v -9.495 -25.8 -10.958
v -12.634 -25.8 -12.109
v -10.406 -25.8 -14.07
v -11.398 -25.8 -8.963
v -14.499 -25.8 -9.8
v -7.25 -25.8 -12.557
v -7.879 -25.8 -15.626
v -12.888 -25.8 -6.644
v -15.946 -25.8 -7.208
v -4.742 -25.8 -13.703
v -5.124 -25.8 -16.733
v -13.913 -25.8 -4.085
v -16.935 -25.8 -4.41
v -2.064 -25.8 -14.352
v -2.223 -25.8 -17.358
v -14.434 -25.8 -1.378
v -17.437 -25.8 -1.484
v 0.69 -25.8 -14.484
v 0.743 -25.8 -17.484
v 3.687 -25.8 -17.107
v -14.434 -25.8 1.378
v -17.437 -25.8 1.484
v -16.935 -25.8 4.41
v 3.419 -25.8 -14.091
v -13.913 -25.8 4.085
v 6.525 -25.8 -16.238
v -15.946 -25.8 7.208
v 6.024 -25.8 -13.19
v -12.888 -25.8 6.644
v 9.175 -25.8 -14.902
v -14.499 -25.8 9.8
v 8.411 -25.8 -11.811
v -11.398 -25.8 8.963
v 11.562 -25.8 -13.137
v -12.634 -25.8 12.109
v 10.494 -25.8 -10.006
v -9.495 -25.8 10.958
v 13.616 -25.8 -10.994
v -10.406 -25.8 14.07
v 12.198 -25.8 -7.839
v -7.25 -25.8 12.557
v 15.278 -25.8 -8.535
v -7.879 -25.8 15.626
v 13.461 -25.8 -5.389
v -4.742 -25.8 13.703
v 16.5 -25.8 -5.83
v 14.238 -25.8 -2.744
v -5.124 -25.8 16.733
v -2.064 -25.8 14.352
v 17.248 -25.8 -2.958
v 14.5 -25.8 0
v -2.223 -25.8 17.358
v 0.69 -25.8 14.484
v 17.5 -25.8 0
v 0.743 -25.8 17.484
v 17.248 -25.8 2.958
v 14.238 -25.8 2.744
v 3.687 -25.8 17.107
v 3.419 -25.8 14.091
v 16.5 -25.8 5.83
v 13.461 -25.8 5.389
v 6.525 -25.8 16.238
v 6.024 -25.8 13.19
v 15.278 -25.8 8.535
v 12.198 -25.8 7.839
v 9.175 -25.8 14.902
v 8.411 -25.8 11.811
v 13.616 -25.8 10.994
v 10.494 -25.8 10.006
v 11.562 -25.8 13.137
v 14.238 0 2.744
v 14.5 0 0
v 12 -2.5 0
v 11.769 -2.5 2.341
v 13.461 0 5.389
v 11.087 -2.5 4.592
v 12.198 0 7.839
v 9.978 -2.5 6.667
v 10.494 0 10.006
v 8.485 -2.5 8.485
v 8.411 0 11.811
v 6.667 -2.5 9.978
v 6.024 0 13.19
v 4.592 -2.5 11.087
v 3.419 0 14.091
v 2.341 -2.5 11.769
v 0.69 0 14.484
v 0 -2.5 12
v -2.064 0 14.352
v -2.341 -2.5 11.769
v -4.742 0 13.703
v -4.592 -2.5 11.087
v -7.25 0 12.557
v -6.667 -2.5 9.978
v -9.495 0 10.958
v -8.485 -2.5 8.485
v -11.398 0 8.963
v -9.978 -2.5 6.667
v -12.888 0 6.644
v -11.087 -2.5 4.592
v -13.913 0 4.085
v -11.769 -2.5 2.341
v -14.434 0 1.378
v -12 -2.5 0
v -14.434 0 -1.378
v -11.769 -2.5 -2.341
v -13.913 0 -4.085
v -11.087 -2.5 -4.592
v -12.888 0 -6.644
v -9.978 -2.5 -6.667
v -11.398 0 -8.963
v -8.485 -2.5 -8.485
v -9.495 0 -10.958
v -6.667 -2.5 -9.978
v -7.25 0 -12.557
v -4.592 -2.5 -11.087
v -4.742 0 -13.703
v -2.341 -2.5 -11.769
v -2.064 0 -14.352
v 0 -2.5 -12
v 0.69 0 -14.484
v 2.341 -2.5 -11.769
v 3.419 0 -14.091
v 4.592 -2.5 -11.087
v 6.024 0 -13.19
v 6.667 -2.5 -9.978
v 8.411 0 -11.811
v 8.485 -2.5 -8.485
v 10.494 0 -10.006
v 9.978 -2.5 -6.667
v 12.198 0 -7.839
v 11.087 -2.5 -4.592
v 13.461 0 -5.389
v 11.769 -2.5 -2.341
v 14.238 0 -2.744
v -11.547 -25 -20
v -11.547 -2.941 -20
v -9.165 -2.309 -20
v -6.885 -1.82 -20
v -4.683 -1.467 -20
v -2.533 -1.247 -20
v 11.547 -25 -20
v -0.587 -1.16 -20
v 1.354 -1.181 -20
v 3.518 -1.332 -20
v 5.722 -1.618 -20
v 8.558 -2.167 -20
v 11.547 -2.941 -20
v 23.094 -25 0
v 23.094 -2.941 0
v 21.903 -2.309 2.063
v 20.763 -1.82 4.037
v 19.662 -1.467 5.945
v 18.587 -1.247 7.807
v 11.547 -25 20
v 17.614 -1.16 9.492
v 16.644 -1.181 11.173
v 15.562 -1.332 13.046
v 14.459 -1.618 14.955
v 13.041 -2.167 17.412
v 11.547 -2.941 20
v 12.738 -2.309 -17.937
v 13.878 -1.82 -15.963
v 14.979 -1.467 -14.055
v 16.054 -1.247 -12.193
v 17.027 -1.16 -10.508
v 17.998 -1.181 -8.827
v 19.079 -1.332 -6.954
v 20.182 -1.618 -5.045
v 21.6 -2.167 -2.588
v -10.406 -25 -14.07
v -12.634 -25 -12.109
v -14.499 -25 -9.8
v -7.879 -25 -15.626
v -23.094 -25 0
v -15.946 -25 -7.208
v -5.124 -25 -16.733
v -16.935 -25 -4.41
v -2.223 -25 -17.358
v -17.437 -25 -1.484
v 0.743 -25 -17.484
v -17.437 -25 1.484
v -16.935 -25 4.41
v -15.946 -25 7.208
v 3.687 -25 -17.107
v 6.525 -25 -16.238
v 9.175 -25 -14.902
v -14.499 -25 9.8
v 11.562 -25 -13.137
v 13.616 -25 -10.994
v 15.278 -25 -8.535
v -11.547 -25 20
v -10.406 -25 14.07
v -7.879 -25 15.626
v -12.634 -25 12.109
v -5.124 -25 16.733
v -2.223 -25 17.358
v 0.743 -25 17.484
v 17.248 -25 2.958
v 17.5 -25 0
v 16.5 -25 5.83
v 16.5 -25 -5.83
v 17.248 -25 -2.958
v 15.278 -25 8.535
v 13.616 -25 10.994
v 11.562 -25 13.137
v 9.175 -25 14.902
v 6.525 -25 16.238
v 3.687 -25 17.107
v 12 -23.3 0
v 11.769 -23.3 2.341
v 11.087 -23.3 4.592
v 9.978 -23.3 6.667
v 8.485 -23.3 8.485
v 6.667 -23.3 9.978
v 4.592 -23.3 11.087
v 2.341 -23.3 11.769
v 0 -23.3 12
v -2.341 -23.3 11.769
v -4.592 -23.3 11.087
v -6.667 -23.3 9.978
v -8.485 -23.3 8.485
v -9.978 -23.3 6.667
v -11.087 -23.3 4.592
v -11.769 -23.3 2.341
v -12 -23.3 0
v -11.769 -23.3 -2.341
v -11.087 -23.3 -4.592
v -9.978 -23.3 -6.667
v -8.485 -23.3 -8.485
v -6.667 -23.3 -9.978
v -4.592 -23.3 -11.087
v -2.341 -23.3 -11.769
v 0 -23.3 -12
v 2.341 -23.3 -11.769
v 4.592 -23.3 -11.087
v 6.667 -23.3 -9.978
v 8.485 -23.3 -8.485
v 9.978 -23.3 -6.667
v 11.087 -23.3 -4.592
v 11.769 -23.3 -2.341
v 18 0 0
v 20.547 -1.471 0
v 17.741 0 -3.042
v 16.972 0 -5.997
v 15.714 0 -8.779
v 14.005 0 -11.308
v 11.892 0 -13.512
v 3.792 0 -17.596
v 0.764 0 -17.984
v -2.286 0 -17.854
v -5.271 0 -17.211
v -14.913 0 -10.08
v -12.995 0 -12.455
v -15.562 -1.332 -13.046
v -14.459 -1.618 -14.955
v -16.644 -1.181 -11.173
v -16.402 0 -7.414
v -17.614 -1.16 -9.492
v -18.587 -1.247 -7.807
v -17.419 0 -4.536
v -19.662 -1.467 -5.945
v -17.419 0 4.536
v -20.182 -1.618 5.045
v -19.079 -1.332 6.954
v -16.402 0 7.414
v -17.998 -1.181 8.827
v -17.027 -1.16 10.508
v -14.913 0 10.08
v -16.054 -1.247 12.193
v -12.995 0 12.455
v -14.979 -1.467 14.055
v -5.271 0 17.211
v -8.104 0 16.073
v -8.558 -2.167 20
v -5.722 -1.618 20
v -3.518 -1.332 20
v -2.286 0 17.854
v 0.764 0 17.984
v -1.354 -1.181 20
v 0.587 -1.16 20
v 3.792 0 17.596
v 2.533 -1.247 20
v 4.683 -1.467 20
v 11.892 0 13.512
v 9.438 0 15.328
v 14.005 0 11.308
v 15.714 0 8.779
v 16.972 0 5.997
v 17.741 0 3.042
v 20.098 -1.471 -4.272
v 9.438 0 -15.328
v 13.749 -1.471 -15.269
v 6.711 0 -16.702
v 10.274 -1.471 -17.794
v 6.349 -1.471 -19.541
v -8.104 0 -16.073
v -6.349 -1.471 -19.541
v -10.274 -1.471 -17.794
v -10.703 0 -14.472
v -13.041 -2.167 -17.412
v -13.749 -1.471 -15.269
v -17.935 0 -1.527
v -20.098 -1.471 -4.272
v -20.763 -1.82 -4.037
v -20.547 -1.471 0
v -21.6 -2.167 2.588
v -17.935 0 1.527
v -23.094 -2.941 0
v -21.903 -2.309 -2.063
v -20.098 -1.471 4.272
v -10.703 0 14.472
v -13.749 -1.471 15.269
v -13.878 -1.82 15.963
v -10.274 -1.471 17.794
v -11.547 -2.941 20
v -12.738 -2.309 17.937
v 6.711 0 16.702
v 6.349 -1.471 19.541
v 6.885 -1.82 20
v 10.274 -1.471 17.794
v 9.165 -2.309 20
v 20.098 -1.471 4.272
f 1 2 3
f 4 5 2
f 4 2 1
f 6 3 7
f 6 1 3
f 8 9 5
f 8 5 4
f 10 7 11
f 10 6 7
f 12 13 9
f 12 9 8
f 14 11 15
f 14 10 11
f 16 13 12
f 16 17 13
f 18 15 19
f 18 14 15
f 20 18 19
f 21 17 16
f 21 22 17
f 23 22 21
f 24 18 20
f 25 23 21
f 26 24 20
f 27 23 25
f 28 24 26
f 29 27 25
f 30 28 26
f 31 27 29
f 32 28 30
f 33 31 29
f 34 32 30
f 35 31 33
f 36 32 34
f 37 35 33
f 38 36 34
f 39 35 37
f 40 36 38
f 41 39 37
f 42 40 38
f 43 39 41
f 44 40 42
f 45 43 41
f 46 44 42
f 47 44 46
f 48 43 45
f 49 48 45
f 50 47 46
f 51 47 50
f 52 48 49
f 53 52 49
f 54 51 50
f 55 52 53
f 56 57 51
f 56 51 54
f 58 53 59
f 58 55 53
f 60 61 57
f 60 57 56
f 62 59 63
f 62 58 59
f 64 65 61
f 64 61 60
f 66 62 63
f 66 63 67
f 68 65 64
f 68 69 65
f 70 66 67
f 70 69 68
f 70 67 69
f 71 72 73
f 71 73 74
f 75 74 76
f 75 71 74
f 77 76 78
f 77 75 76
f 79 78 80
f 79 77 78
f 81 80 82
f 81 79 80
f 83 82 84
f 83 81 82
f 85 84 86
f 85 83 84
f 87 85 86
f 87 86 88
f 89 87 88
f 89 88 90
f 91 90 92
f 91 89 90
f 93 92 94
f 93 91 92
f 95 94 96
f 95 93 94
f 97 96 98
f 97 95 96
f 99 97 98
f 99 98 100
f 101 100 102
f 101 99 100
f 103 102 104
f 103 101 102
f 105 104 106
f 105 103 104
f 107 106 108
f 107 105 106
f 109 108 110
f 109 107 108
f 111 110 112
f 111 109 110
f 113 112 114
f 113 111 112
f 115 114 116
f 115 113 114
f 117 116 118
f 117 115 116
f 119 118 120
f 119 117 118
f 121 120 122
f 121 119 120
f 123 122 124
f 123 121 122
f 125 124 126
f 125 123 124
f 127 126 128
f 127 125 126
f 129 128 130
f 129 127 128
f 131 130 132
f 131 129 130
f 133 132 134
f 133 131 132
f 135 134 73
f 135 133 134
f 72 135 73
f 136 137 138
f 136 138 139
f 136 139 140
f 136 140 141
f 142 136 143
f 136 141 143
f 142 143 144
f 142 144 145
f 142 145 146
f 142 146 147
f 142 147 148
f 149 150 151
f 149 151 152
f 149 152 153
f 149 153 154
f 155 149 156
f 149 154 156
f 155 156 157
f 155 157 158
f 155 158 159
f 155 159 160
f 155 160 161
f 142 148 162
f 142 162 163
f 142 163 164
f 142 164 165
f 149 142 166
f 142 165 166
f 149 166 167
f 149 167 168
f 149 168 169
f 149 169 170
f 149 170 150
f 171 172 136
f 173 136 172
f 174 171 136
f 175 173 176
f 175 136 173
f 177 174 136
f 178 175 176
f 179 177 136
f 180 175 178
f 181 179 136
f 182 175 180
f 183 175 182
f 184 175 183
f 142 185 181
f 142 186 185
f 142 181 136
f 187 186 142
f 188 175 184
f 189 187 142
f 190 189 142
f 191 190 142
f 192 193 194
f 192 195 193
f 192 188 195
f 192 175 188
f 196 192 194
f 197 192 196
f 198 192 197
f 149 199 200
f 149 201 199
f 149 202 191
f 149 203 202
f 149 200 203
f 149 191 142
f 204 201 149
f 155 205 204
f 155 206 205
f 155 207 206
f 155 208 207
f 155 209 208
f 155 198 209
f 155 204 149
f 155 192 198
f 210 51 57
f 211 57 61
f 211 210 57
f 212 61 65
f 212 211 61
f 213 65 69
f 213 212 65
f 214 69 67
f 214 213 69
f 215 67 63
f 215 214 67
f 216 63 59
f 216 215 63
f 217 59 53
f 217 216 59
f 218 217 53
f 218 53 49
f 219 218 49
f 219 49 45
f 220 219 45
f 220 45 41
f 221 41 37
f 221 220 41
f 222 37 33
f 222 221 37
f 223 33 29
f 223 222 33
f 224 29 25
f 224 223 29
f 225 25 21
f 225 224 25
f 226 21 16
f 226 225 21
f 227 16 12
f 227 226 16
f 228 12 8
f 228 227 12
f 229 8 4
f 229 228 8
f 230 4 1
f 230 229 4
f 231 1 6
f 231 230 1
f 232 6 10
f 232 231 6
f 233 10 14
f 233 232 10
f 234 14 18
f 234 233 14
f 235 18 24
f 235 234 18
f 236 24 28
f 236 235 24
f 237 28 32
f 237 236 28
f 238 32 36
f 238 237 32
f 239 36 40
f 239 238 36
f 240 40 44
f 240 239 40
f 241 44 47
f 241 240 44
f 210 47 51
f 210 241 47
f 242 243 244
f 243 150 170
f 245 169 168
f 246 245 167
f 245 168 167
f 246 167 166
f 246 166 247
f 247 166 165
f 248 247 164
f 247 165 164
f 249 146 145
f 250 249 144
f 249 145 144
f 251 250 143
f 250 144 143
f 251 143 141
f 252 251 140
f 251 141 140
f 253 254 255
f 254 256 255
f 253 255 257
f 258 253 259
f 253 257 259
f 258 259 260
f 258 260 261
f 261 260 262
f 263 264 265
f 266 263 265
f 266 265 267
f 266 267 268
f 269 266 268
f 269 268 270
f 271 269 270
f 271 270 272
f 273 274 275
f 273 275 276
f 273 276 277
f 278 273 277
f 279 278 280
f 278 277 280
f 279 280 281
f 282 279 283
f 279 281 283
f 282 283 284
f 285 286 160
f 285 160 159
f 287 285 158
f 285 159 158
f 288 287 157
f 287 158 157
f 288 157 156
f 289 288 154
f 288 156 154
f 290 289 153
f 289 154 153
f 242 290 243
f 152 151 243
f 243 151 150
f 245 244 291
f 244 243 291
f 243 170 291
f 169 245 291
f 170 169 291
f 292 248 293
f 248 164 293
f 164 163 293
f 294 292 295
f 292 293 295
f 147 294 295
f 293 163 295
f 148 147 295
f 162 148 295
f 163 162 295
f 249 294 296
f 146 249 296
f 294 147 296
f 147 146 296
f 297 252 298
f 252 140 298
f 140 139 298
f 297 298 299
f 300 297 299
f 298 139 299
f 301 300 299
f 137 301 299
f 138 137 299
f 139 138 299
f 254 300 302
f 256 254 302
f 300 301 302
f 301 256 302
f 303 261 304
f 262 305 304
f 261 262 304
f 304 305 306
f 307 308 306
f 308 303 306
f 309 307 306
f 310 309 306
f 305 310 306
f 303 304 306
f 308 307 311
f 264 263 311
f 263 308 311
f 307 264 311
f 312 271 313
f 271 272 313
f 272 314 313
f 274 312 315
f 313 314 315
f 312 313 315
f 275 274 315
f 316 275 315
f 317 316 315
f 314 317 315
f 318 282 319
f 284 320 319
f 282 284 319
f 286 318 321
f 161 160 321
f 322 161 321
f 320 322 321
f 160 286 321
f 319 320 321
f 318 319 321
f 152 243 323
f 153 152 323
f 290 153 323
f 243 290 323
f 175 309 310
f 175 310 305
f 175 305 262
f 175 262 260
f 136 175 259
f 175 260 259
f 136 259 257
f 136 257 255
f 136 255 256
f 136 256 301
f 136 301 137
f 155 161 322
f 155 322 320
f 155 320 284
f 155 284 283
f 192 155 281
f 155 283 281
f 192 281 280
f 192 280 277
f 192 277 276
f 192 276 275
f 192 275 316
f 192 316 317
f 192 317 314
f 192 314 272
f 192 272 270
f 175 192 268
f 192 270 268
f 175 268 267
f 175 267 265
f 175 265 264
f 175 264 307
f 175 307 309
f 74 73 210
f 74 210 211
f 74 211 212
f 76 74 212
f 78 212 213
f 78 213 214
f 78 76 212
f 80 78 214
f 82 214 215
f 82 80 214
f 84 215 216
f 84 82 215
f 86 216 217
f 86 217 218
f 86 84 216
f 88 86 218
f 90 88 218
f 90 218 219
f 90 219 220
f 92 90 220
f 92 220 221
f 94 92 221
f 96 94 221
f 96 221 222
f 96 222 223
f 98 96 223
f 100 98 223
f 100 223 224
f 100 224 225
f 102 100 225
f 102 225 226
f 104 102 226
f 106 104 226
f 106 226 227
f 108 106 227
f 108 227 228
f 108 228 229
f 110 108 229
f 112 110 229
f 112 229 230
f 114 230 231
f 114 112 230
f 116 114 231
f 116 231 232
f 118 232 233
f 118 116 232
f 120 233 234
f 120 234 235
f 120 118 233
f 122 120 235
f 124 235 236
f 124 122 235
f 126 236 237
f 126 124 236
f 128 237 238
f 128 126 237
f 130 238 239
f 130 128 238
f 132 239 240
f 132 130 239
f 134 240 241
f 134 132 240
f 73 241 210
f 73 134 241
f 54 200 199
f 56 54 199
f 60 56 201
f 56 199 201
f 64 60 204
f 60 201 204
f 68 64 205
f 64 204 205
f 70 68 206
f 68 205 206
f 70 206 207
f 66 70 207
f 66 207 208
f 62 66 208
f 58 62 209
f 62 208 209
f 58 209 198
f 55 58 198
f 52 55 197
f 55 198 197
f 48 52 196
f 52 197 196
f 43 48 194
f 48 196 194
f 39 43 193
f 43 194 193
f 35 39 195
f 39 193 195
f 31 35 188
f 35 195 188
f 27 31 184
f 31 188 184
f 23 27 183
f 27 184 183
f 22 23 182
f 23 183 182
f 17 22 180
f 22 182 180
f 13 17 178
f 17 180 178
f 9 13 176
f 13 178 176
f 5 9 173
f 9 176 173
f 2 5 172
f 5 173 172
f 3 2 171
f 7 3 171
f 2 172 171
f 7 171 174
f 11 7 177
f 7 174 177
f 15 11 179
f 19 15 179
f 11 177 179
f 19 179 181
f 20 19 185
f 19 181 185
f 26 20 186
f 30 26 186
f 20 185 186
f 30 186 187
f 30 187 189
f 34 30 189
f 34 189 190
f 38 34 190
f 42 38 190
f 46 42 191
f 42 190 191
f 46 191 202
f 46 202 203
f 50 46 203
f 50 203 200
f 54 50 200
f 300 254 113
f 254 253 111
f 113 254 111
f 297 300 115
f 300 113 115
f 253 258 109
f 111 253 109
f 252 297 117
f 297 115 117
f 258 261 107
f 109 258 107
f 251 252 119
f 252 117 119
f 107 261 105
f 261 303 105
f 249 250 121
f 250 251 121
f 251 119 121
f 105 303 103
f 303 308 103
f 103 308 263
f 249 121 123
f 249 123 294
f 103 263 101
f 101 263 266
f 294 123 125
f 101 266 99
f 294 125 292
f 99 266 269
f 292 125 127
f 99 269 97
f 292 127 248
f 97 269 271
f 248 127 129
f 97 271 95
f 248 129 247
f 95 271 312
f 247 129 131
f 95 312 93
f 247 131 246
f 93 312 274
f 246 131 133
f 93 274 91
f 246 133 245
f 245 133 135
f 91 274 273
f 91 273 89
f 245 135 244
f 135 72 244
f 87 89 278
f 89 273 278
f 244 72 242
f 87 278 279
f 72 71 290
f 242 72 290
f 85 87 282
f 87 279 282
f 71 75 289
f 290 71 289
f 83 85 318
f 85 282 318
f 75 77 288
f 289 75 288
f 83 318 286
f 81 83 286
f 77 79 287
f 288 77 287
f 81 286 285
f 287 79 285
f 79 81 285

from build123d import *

# Parameters (mm, degrees)
F0_R     = 12
F1_DEPTH = 25
F4_R     = 17.5
F4_R_2   = 12
F5_DEPTH = 0.8
F6_SIZE  = 2.5


with BuildPart() as f1:
    # F0 (on Front) → F1 (new body)
    with BuildSketch(Plane.XZ):
        Polygon((11.547005, -20), (23.094011, 0), (11.547005, 20), (-11.547005, 20), (-23.094011, 0), (-11.547005, -20), align=None)
        Circle(F0_R, mode=Mode.SUBTRACT)
    extrude(amount=F1_DEPTH)

    # F2 (on Top) → F3 (revolve, cut)
    with BuildSketch(Plane.XY):
        Polygon((31.622065, 2.590499), (18, 0), (34.060234, -9.272381), align=None)
    revolve(axis=Axis((0, -9.323449, 0), (0, 1, 0)), mode=Mode.SUBTRACT)

    # F4 (on face) → F5 (join)
    with BuildSketch(Plane.XZ.offset(25)):
        Circle(F4_R)
        Circle(F4_R_2, mode=Mode.SUBTRACT)
    extrude(amount=F5_DEPTH)

    # F6
    f6_edges = [f1.edges().sort_by_distance(p)[0] for p in [
        (-12, -25.8, 0),
        (-12, 0, 0),
    ]]
    chamfer(f6_edges, length=F6_SIZE)


solid = f1.part
